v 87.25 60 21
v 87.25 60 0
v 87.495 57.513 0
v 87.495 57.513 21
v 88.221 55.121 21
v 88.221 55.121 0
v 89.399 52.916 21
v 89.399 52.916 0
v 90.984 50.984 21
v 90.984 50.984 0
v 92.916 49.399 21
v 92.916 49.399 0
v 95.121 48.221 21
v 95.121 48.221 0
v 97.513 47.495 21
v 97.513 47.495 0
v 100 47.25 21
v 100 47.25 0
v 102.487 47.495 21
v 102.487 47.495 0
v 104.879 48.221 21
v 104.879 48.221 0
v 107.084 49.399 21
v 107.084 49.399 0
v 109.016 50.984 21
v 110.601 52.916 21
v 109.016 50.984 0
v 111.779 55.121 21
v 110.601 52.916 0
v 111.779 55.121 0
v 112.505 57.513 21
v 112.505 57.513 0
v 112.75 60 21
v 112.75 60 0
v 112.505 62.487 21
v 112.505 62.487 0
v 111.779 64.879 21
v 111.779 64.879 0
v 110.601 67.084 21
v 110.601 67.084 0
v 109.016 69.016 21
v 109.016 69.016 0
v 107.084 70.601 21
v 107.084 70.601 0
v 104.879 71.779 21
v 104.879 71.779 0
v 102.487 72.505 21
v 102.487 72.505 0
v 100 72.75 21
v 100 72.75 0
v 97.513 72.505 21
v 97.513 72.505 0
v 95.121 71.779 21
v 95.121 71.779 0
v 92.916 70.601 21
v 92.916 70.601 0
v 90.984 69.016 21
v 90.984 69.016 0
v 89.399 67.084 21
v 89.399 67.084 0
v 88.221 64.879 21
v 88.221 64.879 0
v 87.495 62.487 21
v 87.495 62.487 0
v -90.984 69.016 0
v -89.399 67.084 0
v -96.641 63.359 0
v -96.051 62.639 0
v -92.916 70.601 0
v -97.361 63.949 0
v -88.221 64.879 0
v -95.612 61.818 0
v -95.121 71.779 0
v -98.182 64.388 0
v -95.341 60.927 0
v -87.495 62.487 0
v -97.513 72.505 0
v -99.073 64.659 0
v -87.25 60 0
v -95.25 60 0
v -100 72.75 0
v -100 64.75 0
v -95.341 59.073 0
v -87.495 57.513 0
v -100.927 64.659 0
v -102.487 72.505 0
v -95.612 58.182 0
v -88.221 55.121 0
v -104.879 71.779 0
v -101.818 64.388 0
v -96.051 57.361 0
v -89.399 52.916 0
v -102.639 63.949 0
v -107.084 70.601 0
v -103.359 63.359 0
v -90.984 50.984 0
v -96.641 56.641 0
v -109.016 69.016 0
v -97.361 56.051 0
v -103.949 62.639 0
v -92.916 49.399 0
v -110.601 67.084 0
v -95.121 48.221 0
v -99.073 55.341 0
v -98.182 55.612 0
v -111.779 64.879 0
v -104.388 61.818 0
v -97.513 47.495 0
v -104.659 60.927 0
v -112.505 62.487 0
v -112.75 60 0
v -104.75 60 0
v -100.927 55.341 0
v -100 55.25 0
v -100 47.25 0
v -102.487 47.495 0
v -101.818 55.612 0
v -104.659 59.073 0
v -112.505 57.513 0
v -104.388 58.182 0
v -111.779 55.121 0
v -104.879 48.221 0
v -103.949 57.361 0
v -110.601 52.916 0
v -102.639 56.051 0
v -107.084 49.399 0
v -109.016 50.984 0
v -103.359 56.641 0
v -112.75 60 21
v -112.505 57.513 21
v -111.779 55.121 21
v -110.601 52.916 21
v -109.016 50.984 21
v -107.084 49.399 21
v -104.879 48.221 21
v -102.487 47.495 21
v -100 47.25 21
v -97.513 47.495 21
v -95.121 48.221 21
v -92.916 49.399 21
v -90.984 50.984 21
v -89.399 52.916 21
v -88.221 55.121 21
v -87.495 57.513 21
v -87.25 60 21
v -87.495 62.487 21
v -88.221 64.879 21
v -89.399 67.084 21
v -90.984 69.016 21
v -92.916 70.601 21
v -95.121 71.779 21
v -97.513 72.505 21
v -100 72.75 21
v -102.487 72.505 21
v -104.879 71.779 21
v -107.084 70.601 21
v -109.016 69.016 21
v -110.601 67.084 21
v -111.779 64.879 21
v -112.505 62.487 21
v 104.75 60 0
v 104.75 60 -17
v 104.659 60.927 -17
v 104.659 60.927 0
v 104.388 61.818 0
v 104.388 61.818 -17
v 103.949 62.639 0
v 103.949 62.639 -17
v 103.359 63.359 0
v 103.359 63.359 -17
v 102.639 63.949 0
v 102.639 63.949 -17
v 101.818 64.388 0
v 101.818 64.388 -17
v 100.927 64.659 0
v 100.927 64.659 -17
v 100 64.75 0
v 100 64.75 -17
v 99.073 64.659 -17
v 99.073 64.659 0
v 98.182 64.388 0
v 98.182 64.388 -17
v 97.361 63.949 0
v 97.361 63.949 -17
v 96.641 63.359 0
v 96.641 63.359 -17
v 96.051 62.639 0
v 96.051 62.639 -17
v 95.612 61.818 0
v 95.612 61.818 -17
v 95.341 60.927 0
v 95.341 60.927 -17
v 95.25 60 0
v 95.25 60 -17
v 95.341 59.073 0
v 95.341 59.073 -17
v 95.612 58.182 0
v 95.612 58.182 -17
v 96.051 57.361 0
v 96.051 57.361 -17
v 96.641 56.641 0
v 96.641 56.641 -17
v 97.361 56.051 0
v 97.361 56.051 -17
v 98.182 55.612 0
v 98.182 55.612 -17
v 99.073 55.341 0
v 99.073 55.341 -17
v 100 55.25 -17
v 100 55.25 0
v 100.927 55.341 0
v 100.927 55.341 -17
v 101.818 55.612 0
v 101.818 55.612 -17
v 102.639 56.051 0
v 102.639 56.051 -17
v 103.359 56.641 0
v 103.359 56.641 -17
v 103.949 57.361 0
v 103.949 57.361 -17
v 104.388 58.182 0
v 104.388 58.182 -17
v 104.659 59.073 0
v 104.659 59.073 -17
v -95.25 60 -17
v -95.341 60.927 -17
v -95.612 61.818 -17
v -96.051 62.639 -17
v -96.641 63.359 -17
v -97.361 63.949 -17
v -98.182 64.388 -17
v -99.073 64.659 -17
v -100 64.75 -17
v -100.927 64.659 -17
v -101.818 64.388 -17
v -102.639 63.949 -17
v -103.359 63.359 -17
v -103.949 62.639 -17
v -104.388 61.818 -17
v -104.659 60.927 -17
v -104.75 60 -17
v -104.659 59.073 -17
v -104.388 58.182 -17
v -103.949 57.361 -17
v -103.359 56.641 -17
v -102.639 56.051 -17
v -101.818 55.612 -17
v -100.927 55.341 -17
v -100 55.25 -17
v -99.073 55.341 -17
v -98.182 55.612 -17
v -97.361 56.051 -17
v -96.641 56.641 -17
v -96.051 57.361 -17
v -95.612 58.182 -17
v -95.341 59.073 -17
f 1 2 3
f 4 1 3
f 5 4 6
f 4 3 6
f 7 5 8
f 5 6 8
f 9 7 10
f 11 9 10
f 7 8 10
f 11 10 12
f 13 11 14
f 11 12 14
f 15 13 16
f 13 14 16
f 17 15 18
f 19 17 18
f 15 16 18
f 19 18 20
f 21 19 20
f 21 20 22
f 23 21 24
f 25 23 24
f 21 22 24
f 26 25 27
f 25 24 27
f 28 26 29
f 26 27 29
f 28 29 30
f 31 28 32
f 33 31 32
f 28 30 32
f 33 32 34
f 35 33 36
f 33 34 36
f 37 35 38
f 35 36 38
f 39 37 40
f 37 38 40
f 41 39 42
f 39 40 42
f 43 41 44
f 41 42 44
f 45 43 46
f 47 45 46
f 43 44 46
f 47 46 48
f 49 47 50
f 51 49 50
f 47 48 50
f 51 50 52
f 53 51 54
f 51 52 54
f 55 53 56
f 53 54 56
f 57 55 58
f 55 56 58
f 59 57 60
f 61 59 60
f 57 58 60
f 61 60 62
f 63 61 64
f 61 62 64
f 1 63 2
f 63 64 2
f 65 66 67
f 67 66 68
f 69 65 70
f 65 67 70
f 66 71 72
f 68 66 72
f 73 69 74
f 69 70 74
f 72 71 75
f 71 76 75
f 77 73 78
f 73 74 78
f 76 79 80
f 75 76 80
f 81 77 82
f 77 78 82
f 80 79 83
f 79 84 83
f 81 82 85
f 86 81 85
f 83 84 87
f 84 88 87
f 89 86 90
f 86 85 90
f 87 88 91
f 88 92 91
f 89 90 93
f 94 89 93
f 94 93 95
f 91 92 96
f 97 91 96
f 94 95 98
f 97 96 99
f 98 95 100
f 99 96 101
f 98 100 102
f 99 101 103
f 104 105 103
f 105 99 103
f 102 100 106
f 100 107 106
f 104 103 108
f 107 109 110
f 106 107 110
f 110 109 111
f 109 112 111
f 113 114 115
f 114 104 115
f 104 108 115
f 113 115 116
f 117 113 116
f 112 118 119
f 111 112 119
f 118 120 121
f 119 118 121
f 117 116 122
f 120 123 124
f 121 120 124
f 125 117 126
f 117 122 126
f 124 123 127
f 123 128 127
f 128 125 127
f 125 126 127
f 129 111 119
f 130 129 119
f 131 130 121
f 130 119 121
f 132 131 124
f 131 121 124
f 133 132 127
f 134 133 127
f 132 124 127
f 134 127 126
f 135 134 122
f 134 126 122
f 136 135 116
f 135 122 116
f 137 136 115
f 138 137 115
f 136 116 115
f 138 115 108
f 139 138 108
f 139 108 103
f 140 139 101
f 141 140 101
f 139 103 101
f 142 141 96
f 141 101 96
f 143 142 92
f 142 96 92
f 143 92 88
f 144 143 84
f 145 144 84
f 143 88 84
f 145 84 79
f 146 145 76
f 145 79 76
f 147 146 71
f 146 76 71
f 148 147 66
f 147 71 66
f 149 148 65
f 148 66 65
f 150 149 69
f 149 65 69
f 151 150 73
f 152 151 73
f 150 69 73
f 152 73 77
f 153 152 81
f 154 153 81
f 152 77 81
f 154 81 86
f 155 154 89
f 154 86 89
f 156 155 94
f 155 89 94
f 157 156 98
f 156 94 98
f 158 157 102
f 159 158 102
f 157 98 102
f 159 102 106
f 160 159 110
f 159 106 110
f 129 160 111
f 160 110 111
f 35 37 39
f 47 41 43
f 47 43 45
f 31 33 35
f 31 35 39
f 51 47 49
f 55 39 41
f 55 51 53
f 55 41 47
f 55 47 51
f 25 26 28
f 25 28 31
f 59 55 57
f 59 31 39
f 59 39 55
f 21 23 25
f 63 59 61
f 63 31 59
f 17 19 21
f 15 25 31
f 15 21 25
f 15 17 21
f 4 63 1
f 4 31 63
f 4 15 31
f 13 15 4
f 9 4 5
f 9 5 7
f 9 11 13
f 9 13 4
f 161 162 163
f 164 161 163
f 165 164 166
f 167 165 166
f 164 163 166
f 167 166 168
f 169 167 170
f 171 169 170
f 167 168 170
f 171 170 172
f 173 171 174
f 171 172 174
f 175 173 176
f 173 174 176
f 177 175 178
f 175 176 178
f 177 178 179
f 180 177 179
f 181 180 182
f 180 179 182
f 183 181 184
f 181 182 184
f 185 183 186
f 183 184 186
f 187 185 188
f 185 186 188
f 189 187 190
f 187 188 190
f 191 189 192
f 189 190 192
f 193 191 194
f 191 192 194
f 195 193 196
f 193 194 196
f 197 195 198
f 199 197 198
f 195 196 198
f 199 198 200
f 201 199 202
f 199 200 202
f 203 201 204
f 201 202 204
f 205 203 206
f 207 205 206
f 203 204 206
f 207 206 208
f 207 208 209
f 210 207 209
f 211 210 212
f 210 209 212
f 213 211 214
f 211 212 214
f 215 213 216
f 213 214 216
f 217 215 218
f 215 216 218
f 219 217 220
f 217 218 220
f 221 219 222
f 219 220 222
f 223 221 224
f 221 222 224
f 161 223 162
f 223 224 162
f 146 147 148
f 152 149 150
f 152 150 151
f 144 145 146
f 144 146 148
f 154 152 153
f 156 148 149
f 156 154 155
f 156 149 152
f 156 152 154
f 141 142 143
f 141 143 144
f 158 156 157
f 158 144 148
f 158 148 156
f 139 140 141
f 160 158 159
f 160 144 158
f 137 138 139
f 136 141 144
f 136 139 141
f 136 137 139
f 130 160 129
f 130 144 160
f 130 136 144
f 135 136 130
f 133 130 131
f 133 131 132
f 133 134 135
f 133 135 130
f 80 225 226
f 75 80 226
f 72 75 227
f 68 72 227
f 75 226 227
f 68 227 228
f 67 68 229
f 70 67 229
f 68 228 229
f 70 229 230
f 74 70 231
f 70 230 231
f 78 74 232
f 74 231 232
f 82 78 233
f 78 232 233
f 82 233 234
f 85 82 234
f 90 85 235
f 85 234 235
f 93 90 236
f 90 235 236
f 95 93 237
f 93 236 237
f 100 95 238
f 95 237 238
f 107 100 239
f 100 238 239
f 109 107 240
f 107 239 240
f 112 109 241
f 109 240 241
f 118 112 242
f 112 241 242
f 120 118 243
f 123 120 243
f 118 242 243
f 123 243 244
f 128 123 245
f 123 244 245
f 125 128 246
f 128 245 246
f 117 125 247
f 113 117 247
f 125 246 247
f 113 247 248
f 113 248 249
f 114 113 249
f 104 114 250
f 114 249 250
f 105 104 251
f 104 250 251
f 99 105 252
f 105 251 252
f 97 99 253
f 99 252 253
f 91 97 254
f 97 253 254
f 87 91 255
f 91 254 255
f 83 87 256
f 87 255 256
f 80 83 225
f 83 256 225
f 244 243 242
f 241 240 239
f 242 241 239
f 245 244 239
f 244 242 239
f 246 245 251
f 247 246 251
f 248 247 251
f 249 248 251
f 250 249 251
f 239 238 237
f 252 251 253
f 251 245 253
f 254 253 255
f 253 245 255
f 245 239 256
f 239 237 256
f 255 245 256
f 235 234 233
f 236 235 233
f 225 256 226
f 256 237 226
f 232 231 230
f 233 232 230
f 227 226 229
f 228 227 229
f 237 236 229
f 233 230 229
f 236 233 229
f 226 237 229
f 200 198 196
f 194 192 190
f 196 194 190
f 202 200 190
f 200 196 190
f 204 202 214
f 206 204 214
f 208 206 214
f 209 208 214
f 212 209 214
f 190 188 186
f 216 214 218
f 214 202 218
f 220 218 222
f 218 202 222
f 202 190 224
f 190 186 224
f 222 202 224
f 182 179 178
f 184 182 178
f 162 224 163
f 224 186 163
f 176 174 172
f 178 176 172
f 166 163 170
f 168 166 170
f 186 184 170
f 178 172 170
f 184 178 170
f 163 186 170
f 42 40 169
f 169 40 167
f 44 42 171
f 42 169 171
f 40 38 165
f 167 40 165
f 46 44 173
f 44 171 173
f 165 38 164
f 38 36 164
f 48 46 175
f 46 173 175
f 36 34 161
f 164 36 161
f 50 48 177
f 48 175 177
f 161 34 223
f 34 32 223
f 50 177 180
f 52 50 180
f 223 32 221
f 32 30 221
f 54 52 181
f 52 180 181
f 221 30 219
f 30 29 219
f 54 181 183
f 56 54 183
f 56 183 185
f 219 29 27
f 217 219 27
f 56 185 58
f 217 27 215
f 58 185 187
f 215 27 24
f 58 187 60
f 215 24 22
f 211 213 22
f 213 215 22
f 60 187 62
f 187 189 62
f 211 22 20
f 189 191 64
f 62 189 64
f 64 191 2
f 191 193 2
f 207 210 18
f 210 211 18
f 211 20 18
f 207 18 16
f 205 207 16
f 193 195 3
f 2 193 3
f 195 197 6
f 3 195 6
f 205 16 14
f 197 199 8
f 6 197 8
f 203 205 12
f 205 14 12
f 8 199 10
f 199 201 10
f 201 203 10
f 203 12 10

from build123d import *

# Parameters (mm, degrees)
SKETCH_5_R                          = 12.75
V09_C_LIGHT_HEADS_D25P5_L21_DEPTH   = 21
V09_C_LIGHT_HEADS_D25P5_L21_2_DEPTH = 21
V09_C_LIGHT_STUDS_D9P5_L17_START    = -17
SKETCH_6_R                          = 4.75
V09_C_LIGHT_STUDS_D9P5_L17_DEPTH    = 17


with BuildPart() as part:
    # 草图5 → V09_C_light_heads_D25p5_L21 (new body)
    with BuildSketch(Plane.XY):
        with Locations(Location((-100, 60, 0), (0, 0, 180))):
            Circle(SKETCH_5_R)
    extrude(amount=V09_C_LIGHT_HEADS_D25P5_L21_DEPTH)



with BuildPart() as body_2:
    # 草图5 → V09_C_light_heads_D25p5_L21 2 (new body)
    with BuildSketch(Plane.XY):
        with Locations(Location((100, 60, 0), (0, 0, 180))):
            Circle(SKETCH_5_R)
    extrude(amount=V09_C_LIGHT_HEADS_D25P5_L21_2_DEPTH)


with BuildPart() as part_1:
    add(part.part)

    add(body_2.part)  # V09_C_light_studs_D9p5_L17 merges body 2
    # 草图6 → V09_C_light_studs_D9p5_L17 (add)
    with BuildSketch(Plane.XY.offset(V09_C_LIGHT_STUDS_D9P5_L17_START)):
        with Locations((-100, 60)):
            Circle(SKETCH_6_R)
        with Locations((100, 60)):
            Circle(SKETCH_6_R)
    extrude(amount=V09_C_LIGHT_STUDS_D9P5_L17_DEPTH)


solid = part_1.part
